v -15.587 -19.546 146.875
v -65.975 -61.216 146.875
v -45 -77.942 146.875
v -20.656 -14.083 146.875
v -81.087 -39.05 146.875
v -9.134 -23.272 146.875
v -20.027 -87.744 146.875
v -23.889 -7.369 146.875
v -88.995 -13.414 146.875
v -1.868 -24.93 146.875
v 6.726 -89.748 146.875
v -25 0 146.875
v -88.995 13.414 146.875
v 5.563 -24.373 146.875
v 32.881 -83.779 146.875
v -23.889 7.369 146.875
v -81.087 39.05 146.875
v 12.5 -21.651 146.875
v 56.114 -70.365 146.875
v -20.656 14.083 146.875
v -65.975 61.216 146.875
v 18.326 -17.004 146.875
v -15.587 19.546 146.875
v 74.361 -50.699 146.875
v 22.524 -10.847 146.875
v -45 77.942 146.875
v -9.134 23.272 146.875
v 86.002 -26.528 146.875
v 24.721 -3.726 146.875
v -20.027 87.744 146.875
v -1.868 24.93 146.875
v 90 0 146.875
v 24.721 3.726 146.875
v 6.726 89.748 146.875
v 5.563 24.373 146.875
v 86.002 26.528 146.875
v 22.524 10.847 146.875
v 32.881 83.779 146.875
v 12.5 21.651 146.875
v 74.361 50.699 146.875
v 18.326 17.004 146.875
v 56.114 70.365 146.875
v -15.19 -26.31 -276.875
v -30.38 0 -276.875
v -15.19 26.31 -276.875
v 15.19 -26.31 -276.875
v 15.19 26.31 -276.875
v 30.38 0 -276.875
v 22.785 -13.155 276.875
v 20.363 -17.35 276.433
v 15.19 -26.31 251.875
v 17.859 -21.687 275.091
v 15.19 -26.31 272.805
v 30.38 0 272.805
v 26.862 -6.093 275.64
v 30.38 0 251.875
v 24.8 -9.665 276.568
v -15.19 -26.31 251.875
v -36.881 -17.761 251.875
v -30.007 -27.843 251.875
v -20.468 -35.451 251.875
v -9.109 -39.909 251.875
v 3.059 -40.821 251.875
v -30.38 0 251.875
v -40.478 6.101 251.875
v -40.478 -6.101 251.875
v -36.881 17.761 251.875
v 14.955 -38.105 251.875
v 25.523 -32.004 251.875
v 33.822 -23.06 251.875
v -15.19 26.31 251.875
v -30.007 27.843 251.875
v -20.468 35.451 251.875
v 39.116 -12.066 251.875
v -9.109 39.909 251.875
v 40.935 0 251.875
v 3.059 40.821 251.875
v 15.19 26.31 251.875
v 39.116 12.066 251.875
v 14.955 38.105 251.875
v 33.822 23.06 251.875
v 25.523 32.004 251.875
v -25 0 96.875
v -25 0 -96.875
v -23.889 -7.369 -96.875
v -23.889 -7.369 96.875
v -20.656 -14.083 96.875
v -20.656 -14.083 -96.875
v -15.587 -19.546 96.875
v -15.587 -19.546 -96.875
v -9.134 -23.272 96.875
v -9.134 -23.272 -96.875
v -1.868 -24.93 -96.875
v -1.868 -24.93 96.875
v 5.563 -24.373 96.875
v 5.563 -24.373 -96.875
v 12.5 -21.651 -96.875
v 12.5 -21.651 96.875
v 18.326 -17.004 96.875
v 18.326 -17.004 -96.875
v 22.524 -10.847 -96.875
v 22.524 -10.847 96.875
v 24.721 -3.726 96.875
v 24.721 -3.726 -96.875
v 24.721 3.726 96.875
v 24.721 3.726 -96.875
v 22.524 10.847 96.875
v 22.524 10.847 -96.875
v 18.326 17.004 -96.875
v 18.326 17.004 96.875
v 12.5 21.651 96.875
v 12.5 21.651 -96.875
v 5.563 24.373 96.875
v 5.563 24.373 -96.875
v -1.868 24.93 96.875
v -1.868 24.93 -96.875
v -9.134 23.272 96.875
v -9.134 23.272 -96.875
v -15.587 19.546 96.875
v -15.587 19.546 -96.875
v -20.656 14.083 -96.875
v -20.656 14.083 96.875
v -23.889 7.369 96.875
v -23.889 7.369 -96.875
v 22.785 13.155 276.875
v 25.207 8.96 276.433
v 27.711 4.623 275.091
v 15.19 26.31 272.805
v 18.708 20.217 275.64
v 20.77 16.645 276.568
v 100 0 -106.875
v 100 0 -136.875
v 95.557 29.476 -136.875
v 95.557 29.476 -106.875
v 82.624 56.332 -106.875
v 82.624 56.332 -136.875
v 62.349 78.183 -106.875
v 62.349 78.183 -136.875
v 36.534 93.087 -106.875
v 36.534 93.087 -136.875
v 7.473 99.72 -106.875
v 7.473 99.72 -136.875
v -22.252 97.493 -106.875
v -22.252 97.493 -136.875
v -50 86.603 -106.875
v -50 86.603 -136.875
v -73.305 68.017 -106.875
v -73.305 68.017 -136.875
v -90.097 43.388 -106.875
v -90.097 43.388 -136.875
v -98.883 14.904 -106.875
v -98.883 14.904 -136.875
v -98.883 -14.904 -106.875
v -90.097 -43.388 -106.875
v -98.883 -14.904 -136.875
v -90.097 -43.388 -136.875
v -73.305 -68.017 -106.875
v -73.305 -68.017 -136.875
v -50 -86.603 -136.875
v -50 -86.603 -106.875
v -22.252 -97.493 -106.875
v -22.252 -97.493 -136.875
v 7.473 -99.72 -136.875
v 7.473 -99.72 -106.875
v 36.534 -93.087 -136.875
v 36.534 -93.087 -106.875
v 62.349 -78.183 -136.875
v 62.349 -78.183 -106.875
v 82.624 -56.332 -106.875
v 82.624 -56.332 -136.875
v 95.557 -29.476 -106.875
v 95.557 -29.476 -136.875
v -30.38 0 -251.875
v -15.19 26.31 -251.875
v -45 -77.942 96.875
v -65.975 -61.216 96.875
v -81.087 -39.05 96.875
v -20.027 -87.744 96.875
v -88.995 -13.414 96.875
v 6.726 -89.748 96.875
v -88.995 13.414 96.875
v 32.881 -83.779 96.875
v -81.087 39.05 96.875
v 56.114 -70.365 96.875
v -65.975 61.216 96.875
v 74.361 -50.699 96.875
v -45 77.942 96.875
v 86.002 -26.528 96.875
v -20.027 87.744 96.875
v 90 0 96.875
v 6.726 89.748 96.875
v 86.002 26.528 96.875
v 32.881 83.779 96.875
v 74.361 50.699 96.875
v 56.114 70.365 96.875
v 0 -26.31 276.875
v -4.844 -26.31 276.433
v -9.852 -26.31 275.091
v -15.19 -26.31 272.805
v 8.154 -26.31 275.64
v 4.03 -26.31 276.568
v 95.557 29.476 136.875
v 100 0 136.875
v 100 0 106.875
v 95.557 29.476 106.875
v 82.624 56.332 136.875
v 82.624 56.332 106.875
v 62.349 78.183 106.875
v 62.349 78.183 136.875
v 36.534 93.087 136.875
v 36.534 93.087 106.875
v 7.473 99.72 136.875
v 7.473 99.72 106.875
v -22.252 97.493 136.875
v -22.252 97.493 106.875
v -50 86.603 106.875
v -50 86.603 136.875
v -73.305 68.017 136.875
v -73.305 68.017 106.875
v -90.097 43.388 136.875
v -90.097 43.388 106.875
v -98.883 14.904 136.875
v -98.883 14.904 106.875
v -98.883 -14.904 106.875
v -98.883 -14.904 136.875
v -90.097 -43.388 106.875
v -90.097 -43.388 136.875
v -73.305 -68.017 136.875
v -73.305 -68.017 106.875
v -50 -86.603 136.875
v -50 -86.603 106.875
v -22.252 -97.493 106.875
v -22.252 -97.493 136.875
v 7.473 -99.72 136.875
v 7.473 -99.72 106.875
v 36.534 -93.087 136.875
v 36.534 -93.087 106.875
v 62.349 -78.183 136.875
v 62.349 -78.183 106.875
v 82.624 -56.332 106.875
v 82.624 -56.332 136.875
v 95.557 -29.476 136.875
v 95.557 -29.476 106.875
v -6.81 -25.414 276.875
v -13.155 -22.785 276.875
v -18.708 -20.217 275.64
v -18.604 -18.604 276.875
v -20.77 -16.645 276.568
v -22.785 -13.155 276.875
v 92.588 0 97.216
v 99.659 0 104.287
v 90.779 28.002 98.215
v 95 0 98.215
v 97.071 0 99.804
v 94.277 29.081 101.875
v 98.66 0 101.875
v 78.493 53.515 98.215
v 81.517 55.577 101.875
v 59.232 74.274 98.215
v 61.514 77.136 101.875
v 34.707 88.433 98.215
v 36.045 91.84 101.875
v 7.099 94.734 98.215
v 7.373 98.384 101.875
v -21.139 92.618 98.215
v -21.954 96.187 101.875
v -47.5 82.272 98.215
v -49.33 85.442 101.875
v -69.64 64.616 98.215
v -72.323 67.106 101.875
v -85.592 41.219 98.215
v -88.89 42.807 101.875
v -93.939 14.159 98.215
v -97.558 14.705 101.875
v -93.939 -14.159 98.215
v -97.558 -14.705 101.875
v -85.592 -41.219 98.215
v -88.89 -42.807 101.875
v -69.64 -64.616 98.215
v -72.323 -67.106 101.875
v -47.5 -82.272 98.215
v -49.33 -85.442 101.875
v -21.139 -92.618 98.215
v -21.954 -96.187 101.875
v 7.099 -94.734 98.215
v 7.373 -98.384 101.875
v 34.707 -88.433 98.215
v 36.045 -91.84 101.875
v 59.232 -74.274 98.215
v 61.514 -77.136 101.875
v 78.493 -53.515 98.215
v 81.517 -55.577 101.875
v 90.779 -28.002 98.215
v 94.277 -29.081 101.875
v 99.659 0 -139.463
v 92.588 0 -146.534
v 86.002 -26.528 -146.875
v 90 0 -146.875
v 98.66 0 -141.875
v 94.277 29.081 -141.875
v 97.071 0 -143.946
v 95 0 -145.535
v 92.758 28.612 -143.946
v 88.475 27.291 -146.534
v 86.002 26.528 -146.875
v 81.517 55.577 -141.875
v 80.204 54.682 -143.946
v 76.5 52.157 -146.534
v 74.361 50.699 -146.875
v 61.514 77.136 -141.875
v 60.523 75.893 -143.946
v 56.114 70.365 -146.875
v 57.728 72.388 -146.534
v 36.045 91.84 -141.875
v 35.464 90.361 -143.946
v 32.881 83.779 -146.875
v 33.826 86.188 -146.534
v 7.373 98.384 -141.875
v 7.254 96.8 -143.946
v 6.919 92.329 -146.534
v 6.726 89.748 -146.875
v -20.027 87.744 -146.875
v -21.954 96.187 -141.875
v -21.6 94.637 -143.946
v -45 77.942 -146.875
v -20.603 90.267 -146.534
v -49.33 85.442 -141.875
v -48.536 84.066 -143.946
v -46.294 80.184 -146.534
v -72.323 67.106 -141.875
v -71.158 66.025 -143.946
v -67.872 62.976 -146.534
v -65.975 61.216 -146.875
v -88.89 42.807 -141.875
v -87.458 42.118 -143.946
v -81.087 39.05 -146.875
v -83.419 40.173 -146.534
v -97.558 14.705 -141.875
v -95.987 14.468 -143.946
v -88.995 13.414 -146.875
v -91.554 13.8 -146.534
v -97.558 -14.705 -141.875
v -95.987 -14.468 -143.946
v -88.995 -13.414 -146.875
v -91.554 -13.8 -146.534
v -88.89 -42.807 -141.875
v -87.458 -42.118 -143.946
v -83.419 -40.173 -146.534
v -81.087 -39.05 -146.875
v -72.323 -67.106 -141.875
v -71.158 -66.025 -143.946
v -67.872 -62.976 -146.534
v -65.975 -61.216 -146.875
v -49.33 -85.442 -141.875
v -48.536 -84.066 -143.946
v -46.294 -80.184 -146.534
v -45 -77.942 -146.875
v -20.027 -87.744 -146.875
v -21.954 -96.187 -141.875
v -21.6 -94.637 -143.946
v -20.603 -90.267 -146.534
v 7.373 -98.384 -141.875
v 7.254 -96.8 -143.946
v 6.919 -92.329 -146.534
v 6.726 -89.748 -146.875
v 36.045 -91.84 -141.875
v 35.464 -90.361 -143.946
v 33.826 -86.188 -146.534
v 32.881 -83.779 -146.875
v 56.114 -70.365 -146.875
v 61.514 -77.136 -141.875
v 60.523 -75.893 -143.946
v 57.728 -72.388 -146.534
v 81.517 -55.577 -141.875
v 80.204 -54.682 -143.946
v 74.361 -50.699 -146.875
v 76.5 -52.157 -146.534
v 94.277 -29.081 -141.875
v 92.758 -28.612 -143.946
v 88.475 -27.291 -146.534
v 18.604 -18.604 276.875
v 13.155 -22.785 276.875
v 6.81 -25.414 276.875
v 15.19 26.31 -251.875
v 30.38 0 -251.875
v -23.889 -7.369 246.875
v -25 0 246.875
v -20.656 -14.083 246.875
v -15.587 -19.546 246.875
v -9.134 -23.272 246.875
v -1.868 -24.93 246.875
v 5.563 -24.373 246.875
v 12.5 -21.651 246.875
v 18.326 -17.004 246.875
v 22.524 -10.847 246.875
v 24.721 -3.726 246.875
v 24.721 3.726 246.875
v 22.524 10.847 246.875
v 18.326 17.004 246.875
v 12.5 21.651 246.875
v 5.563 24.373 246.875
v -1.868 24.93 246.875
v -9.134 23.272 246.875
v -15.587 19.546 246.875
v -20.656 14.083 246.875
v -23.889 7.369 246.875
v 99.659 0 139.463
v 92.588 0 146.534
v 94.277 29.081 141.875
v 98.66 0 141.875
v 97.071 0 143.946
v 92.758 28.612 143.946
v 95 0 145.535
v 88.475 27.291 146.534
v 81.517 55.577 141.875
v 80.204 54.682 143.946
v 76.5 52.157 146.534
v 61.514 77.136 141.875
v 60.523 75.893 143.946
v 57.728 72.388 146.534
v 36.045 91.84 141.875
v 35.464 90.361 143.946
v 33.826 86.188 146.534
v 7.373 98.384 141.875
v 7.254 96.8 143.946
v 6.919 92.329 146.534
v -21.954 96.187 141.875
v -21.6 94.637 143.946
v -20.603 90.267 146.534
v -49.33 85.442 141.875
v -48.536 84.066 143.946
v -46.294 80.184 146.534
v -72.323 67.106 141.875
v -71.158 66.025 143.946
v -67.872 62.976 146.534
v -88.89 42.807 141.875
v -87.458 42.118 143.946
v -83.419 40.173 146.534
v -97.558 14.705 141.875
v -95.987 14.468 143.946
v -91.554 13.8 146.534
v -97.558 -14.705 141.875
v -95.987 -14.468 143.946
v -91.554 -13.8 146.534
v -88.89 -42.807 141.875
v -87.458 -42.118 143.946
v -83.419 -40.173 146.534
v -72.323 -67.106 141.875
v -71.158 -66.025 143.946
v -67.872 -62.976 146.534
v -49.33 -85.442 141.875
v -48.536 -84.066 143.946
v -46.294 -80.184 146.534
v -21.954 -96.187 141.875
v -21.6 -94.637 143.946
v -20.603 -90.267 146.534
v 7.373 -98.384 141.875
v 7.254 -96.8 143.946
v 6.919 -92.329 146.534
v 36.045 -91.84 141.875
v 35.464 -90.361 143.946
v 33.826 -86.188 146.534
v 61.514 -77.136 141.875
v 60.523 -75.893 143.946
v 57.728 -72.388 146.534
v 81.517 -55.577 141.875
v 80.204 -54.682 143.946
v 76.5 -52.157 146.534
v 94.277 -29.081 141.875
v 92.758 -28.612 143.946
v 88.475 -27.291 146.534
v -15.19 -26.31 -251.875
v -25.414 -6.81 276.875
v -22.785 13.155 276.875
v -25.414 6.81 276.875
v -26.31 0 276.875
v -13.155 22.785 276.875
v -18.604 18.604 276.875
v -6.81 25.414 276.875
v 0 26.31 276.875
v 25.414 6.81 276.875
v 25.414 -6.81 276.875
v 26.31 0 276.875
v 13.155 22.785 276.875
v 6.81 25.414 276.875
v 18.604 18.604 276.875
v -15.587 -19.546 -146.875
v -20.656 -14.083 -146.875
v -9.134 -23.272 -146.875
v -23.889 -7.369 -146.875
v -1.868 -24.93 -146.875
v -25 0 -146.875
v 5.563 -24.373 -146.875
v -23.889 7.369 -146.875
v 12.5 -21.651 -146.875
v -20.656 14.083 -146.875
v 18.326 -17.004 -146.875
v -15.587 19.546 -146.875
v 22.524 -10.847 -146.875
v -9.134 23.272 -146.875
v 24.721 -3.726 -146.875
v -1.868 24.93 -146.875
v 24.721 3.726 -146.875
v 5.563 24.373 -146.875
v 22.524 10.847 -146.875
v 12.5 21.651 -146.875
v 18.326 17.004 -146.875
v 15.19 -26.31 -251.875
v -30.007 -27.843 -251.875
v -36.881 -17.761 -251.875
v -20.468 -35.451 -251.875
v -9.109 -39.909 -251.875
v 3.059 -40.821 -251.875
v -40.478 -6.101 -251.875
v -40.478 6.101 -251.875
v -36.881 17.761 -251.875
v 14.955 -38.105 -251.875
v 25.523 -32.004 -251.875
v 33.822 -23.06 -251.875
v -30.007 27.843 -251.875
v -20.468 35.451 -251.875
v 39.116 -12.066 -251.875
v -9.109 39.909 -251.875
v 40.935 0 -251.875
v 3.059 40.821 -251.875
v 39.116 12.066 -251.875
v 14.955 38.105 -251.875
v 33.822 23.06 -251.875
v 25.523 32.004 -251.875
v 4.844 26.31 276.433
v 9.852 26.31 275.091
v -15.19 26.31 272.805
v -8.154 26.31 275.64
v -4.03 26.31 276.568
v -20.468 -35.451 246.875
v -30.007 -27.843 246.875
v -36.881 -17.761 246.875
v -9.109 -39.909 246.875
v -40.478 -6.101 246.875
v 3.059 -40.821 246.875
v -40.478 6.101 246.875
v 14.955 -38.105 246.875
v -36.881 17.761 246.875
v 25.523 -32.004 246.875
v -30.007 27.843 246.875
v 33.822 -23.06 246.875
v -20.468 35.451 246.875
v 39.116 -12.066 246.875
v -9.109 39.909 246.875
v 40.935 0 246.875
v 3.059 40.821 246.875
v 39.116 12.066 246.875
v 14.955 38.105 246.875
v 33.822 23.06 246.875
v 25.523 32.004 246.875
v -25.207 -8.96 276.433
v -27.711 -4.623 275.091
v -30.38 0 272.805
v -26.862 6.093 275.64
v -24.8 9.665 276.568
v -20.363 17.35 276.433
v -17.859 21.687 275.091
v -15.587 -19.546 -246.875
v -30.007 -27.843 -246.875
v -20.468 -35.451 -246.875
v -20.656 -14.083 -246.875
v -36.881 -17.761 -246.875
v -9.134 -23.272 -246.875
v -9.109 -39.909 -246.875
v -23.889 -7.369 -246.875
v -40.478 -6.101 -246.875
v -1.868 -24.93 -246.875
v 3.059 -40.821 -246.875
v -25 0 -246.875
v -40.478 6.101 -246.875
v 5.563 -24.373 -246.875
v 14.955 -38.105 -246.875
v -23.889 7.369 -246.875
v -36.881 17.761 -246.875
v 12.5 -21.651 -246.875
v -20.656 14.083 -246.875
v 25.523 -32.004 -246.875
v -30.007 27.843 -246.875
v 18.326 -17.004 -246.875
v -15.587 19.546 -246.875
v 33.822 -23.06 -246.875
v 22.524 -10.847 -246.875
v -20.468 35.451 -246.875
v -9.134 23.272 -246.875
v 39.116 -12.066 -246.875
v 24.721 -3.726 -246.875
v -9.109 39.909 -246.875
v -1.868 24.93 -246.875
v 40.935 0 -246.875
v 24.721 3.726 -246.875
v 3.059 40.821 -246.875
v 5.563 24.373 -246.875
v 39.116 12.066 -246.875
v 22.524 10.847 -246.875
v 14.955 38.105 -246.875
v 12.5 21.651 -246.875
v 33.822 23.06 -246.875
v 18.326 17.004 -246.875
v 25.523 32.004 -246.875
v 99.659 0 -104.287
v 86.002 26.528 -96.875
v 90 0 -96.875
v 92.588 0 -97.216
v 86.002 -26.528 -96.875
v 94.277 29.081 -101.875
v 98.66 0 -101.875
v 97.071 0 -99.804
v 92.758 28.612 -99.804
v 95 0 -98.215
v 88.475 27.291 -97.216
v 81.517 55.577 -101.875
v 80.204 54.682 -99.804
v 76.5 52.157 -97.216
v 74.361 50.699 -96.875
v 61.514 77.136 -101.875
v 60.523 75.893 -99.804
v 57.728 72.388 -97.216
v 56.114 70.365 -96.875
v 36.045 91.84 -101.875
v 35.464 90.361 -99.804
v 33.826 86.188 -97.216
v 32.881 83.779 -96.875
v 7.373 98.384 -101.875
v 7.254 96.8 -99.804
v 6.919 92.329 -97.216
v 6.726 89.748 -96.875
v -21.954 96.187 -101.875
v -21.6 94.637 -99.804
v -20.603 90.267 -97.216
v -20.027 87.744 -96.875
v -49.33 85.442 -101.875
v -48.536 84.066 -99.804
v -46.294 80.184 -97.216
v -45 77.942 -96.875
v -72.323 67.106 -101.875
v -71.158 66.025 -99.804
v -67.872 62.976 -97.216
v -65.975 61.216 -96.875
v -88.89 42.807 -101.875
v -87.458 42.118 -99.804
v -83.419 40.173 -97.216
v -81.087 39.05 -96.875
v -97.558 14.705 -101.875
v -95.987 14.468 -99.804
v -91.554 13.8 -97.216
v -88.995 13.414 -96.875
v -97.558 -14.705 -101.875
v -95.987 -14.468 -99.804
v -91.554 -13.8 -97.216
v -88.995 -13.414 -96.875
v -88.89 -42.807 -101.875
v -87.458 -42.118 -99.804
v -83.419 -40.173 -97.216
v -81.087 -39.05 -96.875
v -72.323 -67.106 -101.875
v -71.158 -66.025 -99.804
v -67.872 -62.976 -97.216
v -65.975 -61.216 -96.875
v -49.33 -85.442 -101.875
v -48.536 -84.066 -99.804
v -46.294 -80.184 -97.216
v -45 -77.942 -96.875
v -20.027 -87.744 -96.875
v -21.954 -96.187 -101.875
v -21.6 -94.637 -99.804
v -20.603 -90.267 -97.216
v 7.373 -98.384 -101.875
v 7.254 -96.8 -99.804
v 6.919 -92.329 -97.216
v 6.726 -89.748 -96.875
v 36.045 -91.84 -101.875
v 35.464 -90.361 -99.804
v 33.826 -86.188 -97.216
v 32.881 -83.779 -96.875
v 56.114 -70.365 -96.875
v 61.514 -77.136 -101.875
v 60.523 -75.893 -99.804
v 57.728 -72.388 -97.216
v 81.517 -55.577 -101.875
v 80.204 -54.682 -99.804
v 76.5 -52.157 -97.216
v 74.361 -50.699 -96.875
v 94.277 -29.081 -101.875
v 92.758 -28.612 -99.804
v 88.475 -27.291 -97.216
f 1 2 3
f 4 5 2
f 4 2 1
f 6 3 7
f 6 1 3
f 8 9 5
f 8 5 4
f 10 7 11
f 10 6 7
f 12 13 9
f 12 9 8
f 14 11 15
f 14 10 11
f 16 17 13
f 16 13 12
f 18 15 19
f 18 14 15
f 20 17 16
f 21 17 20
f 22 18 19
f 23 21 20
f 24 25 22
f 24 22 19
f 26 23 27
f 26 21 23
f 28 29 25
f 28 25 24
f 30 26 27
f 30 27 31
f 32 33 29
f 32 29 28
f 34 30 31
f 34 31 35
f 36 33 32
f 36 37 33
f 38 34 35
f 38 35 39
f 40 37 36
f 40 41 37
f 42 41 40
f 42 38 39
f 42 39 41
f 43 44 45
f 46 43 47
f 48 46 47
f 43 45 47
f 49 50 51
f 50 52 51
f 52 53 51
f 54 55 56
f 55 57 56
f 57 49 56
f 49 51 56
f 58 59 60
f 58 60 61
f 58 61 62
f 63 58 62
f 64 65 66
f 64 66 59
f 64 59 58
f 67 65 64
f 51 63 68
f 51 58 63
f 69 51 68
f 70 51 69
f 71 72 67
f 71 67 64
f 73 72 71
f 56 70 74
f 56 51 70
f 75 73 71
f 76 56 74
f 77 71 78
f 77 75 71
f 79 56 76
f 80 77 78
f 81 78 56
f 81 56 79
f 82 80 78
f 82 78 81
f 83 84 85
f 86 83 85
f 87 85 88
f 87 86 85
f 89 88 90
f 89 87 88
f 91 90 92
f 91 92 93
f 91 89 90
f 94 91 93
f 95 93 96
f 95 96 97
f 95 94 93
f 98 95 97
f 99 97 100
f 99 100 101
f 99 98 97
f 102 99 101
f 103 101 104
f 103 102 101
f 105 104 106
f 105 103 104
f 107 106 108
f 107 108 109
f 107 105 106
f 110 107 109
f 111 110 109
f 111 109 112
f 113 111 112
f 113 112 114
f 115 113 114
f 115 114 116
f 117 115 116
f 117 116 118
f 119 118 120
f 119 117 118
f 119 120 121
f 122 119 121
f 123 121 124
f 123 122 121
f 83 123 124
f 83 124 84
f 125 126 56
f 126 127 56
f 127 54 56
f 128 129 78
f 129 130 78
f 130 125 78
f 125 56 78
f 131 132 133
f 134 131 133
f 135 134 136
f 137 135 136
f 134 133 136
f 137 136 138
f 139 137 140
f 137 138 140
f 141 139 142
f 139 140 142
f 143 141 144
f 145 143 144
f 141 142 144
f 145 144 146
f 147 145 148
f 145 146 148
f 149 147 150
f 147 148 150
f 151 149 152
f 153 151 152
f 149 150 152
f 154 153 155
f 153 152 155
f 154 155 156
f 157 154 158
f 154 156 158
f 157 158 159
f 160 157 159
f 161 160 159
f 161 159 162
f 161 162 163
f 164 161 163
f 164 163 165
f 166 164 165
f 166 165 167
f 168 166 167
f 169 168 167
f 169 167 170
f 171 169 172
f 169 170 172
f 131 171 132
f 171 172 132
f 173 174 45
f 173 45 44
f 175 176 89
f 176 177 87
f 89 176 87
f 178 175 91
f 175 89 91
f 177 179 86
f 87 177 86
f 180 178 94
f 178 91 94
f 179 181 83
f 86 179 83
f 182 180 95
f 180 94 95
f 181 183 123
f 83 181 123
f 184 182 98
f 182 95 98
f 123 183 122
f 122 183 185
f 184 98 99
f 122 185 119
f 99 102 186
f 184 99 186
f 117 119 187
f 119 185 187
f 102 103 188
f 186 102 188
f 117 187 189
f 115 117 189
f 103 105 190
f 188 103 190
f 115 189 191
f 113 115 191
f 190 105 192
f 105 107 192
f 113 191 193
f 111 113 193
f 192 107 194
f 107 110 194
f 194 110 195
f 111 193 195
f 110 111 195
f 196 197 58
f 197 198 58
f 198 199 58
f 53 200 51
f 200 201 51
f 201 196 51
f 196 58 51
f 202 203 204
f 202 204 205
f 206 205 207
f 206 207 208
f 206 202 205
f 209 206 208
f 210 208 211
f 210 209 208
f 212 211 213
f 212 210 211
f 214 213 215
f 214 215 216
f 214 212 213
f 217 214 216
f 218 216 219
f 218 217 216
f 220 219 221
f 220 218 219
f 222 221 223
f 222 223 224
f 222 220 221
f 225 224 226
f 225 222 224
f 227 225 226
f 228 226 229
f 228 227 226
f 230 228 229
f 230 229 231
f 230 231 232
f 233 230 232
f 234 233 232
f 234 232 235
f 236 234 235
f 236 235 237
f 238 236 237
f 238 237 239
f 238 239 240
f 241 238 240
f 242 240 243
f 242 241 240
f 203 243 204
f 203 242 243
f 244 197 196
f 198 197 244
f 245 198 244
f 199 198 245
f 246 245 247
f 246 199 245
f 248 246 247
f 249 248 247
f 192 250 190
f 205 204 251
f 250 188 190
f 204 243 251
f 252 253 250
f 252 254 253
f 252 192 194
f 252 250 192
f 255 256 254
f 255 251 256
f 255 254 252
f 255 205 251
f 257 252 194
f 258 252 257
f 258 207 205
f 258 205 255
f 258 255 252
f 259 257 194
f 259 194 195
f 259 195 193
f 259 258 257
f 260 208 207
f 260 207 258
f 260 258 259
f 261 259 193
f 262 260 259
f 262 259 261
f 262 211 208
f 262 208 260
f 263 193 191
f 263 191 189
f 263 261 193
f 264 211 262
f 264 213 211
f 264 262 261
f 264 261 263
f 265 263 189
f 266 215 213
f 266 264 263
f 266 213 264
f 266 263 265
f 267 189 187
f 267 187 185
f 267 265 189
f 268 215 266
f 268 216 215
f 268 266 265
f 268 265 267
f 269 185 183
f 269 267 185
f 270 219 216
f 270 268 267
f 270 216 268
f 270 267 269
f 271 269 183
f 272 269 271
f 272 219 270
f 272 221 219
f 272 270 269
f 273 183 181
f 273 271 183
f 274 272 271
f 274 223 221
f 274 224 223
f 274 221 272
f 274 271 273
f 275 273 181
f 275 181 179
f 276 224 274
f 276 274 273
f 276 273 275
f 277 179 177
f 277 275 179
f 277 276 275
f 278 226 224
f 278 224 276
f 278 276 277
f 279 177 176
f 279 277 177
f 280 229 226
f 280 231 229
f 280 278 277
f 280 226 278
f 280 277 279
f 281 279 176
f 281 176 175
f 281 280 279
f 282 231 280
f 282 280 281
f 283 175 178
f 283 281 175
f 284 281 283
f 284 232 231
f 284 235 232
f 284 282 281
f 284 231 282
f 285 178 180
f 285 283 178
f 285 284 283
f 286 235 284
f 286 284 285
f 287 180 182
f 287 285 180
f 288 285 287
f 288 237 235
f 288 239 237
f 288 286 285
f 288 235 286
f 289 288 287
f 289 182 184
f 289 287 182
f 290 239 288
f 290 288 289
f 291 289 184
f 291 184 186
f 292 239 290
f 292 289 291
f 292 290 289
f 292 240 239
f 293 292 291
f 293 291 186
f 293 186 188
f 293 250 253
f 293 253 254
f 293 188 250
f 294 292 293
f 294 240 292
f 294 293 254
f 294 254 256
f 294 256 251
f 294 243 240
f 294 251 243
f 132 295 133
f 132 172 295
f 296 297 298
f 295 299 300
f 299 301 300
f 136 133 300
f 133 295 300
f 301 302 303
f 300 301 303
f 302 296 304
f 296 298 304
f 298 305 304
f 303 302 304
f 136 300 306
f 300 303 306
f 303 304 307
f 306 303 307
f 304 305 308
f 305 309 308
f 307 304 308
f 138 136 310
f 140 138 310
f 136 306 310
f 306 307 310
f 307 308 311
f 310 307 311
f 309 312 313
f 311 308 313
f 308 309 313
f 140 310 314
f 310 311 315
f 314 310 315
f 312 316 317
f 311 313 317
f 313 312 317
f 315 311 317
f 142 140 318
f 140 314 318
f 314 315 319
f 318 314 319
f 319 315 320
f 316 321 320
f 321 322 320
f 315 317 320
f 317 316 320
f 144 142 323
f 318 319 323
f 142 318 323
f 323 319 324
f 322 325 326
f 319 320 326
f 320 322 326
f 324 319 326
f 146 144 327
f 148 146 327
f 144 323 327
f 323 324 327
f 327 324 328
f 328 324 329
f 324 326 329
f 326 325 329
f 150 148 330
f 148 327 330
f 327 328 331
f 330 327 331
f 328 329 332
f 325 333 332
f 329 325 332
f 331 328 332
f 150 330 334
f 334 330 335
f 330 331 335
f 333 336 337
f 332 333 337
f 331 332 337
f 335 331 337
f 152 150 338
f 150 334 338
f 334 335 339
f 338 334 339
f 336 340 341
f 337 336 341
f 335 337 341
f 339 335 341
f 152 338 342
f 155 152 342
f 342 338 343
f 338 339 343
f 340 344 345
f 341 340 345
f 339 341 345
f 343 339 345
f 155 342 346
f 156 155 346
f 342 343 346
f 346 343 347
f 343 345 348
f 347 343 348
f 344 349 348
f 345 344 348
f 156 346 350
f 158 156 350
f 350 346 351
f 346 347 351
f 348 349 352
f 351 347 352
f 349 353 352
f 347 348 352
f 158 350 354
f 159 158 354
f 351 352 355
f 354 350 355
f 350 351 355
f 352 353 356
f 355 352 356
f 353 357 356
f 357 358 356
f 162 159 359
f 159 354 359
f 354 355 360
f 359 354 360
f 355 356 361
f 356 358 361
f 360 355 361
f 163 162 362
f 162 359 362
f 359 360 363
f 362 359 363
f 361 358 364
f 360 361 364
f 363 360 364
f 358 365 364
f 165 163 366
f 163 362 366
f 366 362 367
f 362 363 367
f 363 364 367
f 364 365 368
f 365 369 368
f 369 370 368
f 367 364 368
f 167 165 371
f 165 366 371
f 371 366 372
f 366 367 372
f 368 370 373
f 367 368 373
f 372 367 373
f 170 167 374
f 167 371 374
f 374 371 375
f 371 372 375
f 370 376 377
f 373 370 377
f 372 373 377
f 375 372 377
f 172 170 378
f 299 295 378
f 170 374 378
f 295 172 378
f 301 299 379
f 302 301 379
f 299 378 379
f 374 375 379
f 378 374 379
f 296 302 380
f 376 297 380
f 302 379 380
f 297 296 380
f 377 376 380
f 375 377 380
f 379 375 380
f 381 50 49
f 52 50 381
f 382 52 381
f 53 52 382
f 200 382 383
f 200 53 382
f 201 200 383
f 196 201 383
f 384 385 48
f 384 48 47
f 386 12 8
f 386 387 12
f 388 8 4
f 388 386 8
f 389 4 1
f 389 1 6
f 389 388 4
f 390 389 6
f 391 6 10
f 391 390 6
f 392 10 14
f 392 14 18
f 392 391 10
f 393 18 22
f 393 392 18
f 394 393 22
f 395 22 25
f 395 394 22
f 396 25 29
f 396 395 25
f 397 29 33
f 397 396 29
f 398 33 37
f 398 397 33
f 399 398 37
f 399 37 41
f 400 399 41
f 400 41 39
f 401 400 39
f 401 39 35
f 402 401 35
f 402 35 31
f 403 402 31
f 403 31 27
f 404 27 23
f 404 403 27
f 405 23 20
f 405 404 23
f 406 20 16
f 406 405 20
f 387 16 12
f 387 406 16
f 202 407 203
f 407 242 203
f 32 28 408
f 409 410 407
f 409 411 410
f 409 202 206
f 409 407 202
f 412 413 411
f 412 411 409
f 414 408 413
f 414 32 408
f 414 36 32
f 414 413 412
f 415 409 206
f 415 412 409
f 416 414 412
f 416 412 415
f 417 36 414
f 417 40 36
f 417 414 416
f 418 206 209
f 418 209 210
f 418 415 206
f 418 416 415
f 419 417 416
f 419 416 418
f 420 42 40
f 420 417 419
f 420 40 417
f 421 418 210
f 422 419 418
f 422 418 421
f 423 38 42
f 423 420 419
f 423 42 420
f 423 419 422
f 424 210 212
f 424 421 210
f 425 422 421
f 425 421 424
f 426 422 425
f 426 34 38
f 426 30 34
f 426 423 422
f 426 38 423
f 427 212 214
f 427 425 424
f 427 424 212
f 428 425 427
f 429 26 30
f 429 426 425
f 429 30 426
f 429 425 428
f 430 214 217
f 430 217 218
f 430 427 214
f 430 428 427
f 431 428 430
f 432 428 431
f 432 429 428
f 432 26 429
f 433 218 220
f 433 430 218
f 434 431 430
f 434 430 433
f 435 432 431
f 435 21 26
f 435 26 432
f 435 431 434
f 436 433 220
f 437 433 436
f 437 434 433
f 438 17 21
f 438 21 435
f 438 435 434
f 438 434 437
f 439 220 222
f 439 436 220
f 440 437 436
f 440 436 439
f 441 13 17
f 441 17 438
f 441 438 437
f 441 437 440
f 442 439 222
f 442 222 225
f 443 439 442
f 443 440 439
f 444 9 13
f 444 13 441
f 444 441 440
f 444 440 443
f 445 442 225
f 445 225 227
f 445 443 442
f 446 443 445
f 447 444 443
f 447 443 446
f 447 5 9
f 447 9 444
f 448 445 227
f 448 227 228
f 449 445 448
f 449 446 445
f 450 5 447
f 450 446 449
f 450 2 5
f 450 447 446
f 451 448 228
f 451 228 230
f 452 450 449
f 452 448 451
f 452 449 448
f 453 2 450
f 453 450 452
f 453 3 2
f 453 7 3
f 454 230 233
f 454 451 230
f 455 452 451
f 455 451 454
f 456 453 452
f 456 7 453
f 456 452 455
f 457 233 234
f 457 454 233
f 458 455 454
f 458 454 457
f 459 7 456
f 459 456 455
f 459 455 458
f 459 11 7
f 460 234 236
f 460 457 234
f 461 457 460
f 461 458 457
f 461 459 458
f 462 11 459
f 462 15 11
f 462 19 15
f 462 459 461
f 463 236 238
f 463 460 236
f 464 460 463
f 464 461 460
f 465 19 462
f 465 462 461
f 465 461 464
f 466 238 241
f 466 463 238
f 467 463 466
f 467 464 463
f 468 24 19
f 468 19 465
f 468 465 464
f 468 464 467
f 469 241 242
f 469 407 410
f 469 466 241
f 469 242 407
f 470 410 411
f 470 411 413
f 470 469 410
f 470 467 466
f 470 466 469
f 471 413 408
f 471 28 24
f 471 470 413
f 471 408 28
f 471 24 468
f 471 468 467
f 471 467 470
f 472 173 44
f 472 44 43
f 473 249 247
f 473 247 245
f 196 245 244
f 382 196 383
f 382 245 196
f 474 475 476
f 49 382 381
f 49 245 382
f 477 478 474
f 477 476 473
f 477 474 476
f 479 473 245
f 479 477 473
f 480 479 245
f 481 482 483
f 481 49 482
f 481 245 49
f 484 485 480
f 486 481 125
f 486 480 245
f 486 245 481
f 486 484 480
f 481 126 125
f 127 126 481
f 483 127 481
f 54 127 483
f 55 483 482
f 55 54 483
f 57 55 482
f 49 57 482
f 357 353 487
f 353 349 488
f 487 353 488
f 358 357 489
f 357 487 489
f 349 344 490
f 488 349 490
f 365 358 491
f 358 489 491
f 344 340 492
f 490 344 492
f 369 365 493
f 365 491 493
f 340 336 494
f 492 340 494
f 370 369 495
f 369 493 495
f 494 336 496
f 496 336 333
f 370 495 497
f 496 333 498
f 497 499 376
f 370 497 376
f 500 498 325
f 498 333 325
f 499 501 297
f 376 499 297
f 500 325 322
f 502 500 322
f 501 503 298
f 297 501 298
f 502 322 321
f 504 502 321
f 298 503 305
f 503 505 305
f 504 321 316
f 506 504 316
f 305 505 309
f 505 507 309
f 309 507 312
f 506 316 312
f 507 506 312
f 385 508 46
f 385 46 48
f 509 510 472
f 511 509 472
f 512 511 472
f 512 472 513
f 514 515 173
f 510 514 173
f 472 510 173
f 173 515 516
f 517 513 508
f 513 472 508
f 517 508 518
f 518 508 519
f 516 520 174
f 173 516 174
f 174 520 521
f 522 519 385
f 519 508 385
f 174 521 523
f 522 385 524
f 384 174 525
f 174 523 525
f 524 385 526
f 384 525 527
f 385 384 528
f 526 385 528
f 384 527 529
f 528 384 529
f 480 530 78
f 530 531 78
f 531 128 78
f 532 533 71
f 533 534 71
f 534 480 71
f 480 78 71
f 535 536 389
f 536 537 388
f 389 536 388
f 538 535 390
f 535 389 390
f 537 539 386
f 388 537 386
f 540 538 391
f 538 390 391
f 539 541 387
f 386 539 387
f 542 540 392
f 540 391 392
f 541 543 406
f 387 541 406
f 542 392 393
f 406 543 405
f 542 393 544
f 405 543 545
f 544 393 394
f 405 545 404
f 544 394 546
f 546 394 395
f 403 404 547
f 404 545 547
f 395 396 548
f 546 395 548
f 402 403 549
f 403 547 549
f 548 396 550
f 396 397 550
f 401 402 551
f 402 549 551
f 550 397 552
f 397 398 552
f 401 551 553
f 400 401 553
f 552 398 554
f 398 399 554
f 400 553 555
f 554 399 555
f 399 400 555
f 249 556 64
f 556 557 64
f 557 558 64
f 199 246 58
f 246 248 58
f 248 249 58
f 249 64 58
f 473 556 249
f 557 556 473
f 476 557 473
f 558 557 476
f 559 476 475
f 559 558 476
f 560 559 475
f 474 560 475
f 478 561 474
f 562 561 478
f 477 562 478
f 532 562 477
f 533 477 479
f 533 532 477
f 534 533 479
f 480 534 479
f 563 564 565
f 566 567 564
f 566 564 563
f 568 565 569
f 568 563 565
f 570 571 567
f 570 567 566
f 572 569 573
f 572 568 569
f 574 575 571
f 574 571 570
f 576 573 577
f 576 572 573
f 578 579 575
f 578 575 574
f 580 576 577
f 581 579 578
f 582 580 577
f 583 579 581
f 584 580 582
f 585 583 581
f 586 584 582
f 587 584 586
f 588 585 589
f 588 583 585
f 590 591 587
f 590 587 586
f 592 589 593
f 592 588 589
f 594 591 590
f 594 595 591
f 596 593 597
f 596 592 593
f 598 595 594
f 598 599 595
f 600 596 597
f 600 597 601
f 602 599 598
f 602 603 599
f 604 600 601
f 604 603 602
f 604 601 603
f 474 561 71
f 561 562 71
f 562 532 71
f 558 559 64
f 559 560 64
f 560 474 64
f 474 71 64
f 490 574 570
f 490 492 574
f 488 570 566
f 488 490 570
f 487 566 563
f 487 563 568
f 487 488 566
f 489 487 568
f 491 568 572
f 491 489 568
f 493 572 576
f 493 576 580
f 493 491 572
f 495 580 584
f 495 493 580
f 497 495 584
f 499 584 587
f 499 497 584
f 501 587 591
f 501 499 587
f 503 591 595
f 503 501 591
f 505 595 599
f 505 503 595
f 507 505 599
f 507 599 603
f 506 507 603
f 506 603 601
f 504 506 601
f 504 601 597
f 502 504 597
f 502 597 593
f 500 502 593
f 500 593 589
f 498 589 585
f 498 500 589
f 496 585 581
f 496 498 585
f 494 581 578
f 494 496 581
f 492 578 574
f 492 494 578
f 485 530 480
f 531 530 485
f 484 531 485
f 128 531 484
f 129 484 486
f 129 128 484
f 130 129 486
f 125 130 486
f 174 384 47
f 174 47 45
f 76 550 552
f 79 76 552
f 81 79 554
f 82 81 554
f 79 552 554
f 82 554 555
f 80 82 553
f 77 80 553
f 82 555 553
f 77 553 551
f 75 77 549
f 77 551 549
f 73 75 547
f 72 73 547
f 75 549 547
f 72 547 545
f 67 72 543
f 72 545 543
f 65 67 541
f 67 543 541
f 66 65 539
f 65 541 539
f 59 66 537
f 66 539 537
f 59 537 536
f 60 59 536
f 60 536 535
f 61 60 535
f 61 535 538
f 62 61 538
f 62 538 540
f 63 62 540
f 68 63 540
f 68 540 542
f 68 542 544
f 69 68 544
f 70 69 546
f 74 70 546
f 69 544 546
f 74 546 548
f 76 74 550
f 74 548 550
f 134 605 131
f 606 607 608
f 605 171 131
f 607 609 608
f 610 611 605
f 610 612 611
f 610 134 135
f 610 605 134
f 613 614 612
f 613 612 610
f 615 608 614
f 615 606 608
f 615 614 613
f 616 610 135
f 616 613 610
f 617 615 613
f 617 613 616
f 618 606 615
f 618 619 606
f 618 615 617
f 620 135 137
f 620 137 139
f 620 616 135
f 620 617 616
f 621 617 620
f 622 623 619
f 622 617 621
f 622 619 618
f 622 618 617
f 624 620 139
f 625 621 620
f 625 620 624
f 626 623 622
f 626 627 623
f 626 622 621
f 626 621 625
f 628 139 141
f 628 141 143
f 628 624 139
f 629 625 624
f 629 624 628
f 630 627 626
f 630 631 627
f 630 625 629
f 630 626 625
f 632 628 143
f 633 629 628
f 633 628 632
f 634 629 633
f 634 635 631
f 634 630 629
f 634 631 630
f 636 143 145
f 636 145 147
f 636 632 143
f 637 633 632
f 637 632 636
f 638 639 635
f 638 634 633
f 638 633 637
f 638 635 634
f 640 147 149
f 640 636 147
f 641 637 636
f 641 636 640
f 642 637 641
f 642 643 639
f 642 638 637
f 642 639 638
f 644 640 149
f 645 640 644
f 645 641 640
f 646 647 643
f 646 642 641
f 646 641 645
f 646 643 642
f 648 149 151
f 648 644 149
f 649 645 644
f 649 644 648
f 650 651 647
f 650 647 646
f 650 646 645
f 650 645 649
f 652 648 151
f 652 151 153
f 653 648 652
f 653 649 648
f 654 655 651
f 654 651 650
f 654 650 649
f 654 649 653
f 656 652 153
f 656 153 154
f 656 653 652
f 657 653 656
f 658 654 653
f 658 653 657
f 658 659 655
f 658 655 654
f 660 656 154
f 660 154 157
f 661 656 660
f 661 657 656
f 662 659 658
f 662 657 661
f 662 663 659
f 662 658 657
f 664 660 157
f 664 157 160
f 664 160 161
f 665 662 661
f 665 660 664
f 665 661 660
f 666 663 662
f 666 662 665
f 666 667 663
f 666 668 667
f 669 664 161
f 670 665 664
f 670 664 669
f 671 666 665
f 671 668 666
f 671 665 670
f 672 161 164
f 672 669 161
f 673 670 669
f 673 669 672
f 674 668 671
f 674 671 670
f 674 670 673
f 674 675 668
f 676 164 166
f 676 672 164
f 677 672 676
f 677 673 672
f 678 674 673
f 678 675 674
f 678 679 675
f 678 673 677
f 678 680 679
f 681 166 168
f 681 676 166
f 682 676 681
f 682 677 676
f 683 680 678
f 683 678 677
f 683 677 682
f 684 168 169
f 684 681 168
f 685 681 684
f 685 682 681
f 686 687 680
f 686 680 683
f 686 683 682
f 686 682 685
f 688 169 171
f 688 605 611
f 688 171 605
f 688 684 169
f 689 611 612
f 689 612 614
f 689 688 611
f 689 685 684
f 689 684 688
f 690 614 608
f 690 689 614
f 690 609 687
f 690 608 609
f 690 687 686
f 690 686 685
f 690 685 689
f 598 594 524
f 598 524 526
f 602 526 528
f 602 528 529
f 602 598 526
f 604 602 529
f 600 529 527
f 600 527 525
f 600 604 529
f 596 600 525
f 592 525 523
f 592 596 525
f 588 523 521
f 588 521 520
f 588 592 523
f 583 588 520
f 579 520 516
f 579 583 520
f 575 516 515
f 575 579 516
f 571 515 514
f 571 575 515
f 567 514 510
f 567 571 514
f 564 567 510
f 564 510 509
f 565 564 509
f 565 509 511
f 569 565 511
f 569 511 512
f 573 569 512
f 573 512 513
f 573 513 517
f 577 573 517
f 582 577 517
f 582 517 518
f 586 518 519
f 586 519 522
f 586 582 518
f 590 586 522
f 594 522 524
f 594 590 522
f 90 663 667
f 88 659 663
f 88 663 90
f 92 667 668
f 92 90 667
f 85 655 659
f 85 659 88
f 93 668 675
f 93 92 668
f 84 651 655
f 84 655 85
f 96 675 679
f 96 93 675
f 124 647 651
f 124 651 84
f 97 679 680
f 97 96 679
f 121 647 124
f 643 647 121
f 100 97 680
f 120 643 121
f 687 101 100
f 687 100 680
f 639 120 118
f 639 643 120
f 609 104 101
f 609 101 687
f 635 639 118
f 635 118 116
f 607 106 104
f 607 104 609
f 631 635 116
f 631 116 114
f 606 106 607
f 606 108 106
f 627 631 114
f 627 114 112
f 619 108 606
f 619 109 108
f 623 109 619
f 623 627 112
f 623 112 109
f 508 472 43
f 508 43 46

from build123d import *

# Parameters (mm, degrees)
SKETCH2_R           = 25
BOSS_EXTRUDE1_DEPTH = 246.875
SKETCH3_R           = 100
BOSS_EXTRUDE2_DEPTH = 50
FILLET1_R           = 10
SKETCH4_R           = 40.935
BOSS_EXTRUDE3_DEPTH = 5
BOSS_EXTRUDE4_DEPTH = 25
SKETCH6_R           = 40.935
SKETCH6_R_2         = 26.31
CUT_EXTRUDE1_DEPTH  = 25
CUT_EXTRUDE1_TAPER  = 45


with BuildPart() as part:
    # Sketch2 → Boss-Extrude1 (new, symmetric)
    with BuildSketch(Plane.XY):
        with Locations(Location((0, 0, 0), (0, 0, 180))):
            Circle(SKETCH2_R)
    extrude(amount=BOSS_EXTRUDE1_DEPTH, both=True)

    # Sketch3 → Boss-Extrude2 (add)
    with BuildSketch(Plane.XY.offset(146.875)):
        Circle(SKETCH3_R)
    boss_extrude2 = extrude(amount=-BOSS_EXTRUDE2_DEPTH)

    # Mirror1: Boss-Extrude2 across plane
    add(boss_extrude2.mirror(Plane.XY))

    # Fillet1
    fillet1_edges = [part.edges().sort_by_distance(p)[0] for p in [
        (-100, 0, -146.875),
        (-100, 0, -96.875),
        (-100, 0, 96.875),
        (-100, 0, 146.875),
    ]]
    fillet(fillet1_edges, radius=FILLET1_R)

    # Sketch4 → Boss-Extrude3 (add)
    with BuildSketch(Plane.XY.offset(246.875)):
        Circle(SKETCH4_R)
    boss_extrude3 = extrude(amount=BOSS_EXTRUDE3_DEPTH)

    # Sketch5 → Boss-Extrude4 (add)
    with BuildSketch(Plane.XY.offset(251.875)):
        Polygon((30.380171165, 0), (15.190085582, 26.31), (-15.190085582, 26.31), (-30.380171165, 0), (-15.190085582, -26.31), (15.190085582, -26.31), align=None)
    boss_extrude4 = extrude(amount=BOSS_EXTRUDE4_DEPTH)

    # Sketch6 → Cut-Extrude1 (cut)
    with BuildSketch(Plane.XY.offset(276.875)):
        Circle(SKETCH6_R)
        Circle(SKETCH6_R_2, mode=Mode.SUBTRACT)
    extrude(amount=-CUT_EXTRUDE1_DEPTH, taper=CUT_EXTRUDE1_TAPER, mode=Mode.SUBTRACT)

    # Mirror2: Boss-Extrude3, Boss-Extrude4 across plane
    add(boss_extrude3.mirror(Plane.XY))
    add(boss_extrude4.mirror(Plane.XY))


solid = part.part
